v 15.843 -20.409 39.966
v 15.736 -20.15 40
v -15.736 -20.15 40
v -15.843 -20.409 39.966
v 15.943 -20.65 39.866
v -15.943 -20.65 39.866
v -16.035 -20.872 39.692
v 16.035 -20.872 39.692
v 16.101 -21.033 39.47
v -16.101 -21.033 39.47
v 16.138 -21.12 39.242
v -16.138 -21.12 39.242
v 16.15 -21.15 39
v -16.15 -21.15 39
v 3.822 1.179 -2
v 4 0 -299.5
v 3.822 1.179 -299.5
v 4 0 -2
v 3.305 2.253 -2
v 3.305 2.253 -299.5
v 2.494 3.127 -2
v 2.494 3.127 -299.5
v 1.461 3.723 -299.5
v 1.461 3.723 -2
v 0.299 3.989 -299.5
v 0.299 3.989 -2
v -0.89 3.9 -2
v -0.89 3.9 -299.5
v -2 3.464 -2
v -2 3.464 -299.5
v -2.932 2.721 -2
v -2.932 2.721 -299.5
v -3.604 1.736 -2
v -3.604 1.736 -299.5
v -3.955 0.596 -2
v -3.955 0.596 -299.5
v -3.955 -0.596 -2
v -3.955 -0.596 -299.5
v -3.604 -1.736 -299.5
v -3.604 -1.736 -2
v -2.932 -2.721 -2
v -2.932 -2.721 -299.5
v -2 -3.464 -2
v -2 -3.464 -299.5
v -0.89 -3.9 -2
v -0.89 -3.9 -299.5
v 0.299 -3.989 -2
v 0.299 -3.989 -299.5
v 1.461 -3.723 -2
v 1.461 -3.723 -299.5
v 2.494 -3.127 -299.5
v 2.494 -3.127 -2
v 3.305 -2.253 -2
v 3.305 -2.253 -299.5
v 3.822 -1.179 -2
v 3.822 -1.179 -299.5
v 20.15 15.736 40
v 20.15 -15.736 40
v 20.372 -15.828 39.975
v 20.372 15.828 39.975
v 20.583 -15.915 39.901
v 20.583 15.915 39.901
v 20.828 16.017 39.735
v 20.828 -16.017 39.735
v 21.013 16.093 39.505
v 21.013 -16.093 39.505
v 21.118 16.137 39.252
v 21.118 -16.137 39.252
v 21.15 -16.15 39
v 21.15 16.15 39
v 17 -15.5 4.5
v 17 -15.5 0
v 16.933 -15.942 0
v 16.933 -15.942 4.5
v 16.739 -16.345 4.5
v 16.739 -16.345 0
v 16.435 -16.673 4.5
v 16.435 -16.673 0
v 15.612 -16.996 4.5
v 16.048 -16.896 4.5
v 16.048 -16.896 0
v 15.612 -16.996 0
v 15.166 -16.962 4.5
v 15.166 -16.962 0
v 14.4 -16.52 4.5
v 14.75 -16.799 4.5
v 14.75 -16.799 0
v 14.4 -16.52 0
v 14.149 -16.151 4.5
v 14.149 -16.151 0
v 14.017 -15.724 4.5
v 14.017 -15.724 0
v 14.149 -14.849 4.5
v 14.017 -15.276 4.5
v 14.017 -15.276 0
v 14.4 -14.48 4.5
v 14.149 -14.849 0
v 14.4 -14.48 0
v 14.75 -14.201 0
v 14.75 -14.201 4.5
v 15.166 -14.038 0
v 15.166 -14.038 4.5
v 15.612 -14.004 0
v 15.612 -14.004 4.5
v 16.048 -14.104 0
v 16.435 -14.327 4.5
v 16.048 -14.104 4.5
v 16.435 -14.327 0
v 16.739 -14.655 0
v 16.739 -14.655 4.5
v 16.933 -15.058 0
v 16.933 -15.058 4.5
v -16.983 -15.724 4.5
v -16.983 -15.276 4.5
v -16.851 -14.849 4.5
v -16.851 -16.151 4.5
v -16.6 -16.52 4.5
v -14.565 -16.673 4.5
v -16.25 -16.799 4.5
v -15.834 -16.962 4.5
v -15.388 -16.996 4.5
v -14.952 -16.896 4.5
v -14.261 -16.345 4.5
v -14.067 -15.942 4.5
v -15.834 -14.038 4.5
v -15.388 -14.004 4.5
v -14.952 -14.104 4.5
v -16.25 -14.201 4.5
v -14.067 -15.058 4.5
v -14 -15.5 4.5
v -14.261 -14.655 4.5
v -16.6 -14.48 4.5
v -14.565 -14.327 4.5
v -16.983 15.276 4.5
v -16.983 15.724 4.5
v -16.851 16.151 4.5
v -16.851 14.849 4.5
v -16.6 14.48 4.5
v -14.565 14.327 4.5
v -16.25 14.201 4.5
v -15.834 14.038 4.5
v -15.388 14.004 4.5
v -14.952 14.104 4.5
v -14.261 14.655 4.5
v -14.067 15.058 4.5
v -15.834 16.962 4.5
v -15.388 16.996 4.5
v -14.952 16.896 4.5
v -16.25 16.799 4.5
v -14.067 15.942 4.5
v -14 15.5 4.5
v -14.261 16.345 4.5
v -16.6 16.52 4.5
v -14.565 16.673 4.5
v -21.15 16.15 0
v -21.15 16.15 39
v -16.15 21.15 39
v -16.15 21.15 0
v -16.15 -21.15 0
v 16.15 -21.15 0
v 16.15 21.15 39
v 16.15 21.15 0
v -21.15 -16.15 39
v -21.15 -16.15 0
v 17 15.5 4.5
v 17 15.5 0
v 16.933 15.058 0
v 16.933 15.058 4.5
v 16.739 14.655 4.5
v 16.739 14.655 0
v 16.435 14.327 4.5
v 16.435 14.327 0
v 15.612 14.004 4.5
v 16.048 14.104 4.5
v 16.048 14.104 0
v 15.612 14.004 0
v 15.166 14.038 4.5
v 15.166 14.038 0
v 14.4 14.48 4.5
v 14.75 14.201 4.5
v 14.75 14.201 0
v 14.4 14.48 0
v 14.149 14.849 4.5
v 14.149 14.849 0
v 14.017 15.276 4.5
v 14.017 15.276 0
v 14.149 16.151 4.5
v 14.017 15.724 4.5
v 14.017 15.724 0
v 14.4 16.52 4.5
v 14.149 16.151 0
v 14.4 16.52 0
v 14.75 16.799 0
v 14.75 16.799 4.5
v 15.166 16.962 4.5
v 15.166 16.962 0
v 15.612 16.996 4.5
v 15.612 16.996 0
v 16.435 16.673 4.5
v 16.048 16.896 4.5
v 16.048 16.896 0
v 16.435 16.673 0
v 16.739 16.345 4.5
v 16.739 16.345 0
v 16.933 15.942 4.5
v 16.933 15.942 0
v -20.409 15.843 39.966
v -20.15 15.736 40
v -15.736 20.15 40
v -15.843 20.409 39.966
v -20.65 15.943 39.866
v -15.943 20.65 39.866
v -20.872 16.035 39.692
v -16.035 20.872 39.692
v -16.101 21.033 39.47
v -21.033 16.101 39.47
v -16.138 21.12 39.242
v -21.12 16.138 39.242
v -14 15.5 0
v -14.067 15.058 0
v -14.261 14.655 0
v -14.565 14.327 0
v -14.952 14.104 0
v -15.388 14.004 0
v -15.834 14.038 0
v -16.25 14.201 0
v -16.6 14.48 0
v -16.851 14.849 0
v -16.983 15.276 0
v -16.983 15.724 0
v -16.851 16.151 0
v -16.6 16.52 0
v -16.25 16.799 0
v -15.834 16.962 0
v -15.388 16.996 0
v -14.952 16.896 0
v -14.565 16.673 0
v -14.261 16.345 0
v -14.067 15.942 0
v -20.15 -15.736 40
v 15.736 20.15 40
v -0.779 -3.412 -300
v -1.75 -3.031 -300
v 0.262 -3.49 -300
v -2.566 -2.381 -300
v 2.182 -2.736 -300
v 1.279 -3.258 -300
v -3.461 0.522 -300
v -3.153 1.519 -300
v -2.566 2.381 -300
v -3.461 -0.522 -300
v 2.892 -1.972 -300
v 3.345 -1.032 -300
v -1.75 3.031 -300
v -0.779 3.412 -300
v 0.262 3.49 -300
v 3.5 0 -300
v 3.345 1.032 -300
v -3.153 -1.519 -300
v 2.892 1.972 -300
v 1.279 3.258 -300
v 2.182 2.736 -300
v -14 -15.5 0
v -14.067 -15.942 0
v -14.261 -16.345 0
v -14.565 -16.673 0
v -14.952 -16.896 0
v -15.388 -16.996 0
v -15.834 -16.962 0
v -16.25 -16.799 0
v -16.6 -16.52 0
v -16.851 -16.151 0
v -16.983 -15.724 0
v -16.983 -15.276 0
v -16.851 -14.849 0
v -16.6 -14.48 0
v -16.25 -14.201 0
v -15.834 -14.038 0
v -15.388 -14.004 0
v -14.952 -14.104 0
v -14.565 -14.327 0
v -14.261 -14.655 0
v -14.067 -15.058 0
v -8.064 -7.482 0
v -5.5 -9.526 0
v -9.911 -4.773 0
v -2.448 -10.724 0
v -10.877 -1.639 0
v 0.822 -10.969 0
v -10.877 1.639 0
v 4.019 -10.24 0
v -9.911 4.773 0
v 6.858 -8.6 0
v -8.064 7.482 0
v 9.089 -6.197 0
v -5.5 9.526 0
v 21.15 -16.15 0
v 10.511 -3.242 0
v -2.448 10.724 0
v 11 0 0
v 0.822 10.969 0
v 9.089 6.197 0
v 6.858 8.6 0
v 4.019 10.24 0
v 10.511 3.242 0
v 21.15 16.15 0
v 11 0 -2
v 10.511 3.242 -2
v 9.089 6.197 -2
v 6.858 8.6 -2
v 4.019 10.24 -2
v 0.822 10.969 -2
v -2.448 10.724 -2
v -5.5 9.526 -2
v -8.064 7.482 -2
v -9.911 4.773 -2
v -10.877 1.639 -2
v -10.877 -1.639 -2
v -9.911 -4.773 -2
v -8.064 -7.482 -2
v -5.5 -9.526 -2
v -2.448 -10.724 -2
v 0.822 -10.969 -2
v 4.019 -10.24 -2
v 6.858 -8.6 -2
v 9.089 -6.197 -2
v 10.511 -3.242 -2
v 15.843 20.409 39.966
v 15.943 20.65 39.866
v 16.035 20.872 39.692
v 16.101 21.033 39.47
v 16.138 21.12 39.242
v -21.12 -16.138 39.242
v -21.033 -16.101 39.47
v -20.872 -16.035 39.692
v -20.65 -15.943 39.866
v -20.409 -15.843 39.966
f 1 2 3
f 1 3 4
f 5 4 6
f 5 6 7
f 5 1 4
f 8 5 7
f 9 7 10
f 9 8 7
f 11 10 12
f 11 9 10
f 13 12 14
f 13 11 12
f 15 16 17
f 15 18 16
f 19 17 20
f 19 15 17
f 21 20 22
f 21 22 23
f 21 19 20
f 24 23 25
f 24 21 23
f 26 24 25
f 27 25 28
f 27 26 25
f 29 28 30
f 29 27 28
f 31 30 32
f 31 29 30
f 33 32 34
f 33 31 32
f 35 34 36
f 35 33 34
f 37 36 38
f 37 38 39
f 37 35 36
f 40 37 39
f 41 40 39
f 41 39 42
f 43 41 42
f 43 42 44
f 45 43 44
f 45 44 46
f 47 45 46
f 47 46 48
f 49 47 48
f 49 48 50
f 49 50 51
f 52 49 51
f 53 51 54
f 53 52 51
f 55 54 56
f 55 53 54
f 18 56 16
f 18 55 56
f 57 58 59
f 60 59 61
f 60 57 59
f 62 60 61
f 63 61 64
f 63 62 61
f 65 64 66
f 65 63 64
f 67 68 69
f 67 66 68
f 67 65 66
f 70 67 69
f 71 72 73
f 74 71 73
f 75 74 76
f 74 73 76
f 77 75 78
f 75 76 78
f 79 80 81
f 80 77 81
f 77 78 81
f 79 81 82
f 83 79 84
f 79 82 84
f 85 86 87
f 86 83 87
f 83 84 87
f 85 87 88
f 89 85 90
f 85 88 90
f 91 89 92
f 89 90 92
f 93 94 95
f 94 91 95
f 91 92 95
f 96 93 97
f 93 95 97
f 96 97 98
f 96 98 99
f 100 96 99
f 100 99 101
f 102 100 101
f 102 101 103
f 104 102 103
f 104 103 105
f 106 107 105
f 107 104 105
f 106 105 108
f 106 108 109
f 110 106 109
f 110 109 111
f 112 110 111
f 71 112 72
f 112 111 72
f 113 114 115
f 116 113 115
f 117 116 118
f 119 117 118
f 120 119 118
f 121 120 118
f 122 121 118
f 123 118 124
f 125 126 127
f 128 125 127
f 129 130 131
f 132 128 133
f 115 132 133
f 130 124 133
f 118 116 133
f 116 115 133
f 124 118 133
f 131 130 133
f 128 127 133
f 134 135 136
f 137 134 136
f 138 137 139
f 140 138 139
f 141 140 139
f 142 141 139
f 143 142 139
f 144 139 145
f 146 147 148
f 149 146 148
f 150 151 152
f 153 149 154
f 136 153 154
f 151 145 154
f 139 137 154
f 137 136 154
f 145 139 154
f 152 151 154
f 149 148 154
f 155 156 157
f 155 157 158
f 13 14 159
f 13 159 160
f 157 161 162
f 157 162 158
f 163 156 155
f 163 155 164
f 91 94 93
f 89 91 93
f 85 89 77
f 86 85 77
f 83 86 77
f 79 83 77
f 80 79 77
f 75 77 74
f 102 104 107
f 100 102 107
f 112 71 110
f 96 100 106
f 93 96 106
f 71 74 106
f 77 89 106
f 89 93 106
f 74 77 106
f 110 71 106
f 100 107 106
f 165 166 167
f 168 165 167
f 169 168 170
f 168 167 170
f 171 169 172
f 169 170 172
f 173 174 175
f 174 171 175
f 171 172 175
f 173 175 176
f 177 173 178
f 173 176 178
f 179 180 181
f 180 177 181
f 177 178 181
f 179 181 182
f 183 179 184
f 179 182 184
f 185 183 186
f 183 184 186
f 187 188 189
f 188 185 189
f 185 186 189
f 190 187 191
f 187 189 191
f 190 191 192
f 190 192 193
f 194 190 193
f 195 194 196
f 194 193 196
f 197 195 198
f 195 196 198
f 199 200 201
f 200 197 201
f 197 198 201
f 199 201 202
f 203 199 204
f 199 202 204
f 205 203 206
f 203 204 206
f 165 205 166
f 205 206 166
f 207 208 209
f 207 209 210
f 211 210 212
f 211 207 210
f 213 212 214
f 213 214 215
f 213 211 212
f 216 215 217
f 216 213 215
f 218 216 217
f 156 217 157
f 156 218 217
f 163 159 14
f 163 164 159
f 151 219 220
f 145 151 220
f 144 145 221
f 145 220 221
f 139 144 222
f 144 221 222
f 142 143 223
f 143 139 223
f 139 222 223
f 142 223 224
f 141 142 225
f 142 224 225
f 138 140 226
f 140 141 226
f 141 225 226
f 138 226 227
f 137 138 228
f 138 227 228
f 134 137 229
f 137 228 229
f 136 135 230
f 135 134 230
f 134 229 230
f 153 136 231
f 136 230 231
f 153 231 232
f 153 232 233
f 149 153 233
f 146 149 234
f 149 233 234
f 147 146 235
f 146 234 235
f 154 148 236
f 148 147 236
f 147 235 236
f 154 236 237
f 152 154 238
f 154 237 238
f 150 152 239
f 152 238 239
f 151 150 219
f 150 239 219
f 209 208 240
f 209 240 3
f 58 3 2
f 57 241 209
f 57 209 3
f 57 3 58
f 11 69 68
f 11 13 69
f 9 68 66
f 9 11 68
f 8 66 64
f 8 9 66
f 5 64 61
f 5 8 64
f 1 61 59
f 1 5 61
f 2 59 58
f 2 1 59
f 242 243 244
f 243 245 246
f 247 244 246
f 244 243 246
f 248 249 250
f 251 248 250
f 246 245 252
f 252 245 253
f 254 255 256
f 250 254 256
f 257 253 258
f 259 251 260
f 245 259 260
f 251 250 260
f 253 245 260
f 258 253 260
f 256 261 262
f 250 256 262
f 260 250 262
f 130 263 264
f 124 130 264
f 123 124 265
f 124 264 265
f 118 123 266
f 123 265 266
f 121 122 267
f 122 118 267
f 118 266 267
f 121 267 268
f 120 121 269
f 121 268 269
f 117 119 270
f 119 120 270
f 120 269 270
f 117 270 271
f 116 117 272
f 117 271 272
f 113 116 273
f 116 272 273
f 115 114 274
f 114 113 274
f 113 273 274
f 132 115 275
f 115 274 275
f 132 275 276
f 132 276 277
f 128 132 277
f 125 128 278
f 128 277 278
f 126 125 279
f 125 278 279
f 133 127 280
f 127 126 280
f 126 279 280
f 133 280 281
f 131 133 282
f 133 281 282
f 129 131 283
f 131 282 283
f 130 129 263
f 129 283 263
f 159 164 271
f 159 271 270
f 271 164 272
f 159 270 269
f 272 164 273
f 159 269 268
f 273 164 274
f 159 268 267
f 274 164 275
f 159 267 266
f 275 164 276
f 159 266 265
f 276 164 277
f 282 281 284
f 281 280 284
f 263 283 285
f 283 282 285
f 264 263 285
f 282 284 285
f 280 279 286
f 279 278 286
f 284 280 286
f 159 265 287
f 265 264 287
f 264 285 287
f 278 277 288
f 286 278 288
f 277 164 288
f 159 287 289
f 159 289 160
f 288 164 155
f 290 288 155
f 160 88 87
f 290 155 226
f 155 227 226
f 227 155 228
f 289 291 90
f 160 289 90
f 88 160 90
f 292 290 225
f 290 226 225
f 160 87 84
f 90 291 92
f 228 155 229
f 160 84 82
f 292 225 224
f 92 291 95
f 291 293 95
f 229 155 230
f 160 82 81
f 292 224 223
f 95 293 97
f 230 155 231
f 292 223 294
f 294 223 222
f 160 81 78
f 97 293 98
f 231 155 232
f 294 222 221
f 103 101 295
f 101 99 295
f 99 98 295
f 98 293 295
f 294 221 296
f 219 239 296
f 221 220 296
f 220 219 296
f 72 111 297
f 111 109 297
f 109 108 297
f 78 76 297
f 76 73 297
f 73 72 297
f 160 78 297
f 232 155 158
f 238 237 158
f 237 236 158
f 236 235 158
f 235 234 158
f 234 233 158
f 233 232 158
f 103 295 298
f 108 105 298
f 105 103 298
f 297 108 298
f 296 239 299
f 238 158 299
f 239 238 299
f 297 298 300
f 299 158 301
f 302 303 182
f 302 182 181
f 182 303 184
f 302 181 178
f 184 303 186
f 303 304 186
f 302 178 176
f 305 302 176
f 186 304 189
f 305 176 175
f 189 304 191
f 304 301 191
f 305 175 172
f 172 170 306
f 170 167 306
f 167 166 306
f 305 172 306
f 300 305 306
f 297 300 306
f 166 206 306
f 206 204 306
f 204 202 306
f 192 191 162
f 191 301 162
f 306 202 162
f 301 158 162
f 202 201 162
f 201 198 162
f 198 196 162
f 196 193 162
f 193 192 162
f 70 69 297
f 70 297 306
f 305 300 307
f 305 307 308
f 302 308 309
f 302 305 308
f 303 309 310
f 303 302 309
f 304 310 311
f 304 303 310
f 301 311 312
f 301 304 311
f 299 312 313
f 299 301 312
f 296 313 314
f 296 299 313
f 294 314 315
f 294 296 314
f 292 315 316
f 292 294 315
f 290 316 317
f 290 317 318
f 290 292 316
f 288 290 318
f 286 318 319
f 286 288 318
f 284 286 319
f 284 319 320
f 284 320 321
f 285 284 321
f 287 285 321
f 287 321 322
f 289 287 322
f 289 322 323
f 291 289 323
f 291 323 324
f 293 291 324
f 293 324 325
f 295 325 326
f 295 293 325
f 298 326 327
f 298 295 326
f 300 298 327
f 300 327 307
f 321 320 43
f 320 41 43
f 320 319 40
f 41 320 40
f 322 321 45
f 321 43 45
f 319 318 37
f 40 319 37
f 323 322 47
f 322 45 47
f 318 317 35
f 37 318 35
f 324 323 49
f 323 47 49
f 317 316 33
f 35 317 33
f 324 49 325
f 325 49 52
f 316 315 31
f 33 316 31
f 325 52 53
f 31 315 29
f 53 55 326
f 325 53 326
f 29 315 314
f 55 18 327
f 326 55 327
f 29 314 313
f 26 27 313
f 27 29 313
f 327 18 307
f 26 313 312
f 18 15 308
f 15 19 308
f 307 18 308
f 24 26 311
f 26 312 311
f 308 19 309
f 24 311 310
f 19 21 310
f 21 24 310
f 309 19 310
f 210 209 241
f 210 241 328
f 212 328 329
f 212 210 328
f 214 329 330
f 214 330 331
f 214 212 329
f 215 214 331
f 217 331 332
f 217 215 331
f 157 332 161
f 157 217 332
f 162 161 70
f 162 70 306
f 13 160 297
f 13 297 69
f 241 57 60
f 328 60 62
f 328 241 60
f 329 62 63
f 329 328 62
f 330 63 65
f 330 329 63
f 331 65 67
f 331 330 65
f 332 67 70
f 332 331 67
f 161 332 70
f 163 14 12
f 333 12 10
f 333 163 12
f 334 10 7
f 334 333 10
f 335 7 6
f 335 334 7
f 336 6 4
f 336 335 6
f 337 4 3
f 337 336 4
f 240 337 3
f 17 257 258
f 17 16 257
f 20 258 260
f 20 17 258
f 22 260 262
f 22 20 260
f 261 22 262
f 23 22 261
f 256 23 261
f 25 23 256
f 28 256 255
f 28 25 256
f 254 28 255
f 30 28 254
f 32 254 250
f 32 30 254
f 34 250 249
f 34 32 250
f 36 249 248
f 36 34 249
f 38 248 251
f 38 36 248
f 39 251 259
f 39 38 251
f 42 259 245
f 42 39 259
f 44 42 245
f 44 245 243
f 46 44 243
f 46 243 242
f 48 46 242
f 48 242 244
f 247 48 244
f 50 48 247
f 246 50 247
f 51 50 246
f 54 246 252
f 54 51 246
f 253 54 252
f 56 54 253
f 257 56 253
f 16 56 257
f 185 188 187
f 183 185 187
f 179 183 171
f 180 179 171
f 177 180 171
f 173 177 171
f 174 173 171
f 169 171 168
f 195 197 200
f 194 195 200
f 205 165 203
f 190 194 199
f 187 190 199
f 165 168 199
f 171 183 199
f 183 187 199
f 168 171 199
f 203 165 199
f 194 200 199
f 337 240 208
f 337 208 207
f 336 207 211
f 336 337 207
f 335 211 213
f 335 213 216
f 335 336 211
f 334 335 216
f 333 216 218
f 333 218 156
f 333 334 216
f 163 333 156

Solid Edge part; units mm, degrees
sketch "Sketch1" plane through (0, 0, 0) normal (0, 0, 1) x (1, 0, 0)
  line L0 (21.15, -21.15) -> (21.15, 21.15)
  line L1 (21.15, 21.15) -> (-21.15, 21.15)
  line L2 (-21.15, 21.15) -> (-21.15, -21.15)
  line L3 (-21.15, -21.15) -> (21.15, -21.15)
extrude "Protrusion1" add sketch "Sketch1" along normal blind 40
sketch "Sketch2" plane through (0, 0, 0) normal (0, 0, 1) x (1, 0, 0)
  circle A0 centre (0, 0) radius 11
extrude "ExtrudedProtrusion_2" add sketch "Sketch2" against normal blind 2
sketch "Sketch3" plane through (0, 0, 0) normal (0, 0, 1) x (1, 0, 0)
  circle A0 centre (0, 0) radius 4
extrude "ExtrudedProtrusion_3" add sketch "Sketch3" against normal blind 300
sketch "Sketch4" plane through (0, 0, 0) normal (0, 0, 1) x (1, 0, 0)
  circle A0 centre (15.5, 15.5) radius 1.5
  circle A1 centre (-15.5, 15.5) radius 1.5
  circle A2 centre (-15.5, -15.5) radius 1.5
  circle A3 centre (15.5, -15.5) radius 1.5
  dimension "D1" = 42.3
  dimension "D2" = 22
  dimension "D3" = 8
  dimension "D4" = 31
  dimension "D5" = 3
extrude "ExtrudedCutout_1" cut sketch "Sketch4" along normal blind 4.5
chamfer "Chamfer_1" distance 5 angle 45 4 edges at (21.15, 21.15, 20) (-21.15, 21.15, 20) (-21.15, -21.15, 20) (21.15, -21.15, 20)
fillet "Round_1" radius 1 8 edges at (0, 21.15, 40) (-18.65, 18.65, 40) (-21.15, 0, 40) (-18.65, -18.65, 40) (0, -21.15, 40) (18.65, -18.65, 40) (21.15, 0, 40) (18.65, 18.65, 40)
chamfer "Chamfer_2" distance 0.5 angle 45 1 edges at (-4, 0, -300)
